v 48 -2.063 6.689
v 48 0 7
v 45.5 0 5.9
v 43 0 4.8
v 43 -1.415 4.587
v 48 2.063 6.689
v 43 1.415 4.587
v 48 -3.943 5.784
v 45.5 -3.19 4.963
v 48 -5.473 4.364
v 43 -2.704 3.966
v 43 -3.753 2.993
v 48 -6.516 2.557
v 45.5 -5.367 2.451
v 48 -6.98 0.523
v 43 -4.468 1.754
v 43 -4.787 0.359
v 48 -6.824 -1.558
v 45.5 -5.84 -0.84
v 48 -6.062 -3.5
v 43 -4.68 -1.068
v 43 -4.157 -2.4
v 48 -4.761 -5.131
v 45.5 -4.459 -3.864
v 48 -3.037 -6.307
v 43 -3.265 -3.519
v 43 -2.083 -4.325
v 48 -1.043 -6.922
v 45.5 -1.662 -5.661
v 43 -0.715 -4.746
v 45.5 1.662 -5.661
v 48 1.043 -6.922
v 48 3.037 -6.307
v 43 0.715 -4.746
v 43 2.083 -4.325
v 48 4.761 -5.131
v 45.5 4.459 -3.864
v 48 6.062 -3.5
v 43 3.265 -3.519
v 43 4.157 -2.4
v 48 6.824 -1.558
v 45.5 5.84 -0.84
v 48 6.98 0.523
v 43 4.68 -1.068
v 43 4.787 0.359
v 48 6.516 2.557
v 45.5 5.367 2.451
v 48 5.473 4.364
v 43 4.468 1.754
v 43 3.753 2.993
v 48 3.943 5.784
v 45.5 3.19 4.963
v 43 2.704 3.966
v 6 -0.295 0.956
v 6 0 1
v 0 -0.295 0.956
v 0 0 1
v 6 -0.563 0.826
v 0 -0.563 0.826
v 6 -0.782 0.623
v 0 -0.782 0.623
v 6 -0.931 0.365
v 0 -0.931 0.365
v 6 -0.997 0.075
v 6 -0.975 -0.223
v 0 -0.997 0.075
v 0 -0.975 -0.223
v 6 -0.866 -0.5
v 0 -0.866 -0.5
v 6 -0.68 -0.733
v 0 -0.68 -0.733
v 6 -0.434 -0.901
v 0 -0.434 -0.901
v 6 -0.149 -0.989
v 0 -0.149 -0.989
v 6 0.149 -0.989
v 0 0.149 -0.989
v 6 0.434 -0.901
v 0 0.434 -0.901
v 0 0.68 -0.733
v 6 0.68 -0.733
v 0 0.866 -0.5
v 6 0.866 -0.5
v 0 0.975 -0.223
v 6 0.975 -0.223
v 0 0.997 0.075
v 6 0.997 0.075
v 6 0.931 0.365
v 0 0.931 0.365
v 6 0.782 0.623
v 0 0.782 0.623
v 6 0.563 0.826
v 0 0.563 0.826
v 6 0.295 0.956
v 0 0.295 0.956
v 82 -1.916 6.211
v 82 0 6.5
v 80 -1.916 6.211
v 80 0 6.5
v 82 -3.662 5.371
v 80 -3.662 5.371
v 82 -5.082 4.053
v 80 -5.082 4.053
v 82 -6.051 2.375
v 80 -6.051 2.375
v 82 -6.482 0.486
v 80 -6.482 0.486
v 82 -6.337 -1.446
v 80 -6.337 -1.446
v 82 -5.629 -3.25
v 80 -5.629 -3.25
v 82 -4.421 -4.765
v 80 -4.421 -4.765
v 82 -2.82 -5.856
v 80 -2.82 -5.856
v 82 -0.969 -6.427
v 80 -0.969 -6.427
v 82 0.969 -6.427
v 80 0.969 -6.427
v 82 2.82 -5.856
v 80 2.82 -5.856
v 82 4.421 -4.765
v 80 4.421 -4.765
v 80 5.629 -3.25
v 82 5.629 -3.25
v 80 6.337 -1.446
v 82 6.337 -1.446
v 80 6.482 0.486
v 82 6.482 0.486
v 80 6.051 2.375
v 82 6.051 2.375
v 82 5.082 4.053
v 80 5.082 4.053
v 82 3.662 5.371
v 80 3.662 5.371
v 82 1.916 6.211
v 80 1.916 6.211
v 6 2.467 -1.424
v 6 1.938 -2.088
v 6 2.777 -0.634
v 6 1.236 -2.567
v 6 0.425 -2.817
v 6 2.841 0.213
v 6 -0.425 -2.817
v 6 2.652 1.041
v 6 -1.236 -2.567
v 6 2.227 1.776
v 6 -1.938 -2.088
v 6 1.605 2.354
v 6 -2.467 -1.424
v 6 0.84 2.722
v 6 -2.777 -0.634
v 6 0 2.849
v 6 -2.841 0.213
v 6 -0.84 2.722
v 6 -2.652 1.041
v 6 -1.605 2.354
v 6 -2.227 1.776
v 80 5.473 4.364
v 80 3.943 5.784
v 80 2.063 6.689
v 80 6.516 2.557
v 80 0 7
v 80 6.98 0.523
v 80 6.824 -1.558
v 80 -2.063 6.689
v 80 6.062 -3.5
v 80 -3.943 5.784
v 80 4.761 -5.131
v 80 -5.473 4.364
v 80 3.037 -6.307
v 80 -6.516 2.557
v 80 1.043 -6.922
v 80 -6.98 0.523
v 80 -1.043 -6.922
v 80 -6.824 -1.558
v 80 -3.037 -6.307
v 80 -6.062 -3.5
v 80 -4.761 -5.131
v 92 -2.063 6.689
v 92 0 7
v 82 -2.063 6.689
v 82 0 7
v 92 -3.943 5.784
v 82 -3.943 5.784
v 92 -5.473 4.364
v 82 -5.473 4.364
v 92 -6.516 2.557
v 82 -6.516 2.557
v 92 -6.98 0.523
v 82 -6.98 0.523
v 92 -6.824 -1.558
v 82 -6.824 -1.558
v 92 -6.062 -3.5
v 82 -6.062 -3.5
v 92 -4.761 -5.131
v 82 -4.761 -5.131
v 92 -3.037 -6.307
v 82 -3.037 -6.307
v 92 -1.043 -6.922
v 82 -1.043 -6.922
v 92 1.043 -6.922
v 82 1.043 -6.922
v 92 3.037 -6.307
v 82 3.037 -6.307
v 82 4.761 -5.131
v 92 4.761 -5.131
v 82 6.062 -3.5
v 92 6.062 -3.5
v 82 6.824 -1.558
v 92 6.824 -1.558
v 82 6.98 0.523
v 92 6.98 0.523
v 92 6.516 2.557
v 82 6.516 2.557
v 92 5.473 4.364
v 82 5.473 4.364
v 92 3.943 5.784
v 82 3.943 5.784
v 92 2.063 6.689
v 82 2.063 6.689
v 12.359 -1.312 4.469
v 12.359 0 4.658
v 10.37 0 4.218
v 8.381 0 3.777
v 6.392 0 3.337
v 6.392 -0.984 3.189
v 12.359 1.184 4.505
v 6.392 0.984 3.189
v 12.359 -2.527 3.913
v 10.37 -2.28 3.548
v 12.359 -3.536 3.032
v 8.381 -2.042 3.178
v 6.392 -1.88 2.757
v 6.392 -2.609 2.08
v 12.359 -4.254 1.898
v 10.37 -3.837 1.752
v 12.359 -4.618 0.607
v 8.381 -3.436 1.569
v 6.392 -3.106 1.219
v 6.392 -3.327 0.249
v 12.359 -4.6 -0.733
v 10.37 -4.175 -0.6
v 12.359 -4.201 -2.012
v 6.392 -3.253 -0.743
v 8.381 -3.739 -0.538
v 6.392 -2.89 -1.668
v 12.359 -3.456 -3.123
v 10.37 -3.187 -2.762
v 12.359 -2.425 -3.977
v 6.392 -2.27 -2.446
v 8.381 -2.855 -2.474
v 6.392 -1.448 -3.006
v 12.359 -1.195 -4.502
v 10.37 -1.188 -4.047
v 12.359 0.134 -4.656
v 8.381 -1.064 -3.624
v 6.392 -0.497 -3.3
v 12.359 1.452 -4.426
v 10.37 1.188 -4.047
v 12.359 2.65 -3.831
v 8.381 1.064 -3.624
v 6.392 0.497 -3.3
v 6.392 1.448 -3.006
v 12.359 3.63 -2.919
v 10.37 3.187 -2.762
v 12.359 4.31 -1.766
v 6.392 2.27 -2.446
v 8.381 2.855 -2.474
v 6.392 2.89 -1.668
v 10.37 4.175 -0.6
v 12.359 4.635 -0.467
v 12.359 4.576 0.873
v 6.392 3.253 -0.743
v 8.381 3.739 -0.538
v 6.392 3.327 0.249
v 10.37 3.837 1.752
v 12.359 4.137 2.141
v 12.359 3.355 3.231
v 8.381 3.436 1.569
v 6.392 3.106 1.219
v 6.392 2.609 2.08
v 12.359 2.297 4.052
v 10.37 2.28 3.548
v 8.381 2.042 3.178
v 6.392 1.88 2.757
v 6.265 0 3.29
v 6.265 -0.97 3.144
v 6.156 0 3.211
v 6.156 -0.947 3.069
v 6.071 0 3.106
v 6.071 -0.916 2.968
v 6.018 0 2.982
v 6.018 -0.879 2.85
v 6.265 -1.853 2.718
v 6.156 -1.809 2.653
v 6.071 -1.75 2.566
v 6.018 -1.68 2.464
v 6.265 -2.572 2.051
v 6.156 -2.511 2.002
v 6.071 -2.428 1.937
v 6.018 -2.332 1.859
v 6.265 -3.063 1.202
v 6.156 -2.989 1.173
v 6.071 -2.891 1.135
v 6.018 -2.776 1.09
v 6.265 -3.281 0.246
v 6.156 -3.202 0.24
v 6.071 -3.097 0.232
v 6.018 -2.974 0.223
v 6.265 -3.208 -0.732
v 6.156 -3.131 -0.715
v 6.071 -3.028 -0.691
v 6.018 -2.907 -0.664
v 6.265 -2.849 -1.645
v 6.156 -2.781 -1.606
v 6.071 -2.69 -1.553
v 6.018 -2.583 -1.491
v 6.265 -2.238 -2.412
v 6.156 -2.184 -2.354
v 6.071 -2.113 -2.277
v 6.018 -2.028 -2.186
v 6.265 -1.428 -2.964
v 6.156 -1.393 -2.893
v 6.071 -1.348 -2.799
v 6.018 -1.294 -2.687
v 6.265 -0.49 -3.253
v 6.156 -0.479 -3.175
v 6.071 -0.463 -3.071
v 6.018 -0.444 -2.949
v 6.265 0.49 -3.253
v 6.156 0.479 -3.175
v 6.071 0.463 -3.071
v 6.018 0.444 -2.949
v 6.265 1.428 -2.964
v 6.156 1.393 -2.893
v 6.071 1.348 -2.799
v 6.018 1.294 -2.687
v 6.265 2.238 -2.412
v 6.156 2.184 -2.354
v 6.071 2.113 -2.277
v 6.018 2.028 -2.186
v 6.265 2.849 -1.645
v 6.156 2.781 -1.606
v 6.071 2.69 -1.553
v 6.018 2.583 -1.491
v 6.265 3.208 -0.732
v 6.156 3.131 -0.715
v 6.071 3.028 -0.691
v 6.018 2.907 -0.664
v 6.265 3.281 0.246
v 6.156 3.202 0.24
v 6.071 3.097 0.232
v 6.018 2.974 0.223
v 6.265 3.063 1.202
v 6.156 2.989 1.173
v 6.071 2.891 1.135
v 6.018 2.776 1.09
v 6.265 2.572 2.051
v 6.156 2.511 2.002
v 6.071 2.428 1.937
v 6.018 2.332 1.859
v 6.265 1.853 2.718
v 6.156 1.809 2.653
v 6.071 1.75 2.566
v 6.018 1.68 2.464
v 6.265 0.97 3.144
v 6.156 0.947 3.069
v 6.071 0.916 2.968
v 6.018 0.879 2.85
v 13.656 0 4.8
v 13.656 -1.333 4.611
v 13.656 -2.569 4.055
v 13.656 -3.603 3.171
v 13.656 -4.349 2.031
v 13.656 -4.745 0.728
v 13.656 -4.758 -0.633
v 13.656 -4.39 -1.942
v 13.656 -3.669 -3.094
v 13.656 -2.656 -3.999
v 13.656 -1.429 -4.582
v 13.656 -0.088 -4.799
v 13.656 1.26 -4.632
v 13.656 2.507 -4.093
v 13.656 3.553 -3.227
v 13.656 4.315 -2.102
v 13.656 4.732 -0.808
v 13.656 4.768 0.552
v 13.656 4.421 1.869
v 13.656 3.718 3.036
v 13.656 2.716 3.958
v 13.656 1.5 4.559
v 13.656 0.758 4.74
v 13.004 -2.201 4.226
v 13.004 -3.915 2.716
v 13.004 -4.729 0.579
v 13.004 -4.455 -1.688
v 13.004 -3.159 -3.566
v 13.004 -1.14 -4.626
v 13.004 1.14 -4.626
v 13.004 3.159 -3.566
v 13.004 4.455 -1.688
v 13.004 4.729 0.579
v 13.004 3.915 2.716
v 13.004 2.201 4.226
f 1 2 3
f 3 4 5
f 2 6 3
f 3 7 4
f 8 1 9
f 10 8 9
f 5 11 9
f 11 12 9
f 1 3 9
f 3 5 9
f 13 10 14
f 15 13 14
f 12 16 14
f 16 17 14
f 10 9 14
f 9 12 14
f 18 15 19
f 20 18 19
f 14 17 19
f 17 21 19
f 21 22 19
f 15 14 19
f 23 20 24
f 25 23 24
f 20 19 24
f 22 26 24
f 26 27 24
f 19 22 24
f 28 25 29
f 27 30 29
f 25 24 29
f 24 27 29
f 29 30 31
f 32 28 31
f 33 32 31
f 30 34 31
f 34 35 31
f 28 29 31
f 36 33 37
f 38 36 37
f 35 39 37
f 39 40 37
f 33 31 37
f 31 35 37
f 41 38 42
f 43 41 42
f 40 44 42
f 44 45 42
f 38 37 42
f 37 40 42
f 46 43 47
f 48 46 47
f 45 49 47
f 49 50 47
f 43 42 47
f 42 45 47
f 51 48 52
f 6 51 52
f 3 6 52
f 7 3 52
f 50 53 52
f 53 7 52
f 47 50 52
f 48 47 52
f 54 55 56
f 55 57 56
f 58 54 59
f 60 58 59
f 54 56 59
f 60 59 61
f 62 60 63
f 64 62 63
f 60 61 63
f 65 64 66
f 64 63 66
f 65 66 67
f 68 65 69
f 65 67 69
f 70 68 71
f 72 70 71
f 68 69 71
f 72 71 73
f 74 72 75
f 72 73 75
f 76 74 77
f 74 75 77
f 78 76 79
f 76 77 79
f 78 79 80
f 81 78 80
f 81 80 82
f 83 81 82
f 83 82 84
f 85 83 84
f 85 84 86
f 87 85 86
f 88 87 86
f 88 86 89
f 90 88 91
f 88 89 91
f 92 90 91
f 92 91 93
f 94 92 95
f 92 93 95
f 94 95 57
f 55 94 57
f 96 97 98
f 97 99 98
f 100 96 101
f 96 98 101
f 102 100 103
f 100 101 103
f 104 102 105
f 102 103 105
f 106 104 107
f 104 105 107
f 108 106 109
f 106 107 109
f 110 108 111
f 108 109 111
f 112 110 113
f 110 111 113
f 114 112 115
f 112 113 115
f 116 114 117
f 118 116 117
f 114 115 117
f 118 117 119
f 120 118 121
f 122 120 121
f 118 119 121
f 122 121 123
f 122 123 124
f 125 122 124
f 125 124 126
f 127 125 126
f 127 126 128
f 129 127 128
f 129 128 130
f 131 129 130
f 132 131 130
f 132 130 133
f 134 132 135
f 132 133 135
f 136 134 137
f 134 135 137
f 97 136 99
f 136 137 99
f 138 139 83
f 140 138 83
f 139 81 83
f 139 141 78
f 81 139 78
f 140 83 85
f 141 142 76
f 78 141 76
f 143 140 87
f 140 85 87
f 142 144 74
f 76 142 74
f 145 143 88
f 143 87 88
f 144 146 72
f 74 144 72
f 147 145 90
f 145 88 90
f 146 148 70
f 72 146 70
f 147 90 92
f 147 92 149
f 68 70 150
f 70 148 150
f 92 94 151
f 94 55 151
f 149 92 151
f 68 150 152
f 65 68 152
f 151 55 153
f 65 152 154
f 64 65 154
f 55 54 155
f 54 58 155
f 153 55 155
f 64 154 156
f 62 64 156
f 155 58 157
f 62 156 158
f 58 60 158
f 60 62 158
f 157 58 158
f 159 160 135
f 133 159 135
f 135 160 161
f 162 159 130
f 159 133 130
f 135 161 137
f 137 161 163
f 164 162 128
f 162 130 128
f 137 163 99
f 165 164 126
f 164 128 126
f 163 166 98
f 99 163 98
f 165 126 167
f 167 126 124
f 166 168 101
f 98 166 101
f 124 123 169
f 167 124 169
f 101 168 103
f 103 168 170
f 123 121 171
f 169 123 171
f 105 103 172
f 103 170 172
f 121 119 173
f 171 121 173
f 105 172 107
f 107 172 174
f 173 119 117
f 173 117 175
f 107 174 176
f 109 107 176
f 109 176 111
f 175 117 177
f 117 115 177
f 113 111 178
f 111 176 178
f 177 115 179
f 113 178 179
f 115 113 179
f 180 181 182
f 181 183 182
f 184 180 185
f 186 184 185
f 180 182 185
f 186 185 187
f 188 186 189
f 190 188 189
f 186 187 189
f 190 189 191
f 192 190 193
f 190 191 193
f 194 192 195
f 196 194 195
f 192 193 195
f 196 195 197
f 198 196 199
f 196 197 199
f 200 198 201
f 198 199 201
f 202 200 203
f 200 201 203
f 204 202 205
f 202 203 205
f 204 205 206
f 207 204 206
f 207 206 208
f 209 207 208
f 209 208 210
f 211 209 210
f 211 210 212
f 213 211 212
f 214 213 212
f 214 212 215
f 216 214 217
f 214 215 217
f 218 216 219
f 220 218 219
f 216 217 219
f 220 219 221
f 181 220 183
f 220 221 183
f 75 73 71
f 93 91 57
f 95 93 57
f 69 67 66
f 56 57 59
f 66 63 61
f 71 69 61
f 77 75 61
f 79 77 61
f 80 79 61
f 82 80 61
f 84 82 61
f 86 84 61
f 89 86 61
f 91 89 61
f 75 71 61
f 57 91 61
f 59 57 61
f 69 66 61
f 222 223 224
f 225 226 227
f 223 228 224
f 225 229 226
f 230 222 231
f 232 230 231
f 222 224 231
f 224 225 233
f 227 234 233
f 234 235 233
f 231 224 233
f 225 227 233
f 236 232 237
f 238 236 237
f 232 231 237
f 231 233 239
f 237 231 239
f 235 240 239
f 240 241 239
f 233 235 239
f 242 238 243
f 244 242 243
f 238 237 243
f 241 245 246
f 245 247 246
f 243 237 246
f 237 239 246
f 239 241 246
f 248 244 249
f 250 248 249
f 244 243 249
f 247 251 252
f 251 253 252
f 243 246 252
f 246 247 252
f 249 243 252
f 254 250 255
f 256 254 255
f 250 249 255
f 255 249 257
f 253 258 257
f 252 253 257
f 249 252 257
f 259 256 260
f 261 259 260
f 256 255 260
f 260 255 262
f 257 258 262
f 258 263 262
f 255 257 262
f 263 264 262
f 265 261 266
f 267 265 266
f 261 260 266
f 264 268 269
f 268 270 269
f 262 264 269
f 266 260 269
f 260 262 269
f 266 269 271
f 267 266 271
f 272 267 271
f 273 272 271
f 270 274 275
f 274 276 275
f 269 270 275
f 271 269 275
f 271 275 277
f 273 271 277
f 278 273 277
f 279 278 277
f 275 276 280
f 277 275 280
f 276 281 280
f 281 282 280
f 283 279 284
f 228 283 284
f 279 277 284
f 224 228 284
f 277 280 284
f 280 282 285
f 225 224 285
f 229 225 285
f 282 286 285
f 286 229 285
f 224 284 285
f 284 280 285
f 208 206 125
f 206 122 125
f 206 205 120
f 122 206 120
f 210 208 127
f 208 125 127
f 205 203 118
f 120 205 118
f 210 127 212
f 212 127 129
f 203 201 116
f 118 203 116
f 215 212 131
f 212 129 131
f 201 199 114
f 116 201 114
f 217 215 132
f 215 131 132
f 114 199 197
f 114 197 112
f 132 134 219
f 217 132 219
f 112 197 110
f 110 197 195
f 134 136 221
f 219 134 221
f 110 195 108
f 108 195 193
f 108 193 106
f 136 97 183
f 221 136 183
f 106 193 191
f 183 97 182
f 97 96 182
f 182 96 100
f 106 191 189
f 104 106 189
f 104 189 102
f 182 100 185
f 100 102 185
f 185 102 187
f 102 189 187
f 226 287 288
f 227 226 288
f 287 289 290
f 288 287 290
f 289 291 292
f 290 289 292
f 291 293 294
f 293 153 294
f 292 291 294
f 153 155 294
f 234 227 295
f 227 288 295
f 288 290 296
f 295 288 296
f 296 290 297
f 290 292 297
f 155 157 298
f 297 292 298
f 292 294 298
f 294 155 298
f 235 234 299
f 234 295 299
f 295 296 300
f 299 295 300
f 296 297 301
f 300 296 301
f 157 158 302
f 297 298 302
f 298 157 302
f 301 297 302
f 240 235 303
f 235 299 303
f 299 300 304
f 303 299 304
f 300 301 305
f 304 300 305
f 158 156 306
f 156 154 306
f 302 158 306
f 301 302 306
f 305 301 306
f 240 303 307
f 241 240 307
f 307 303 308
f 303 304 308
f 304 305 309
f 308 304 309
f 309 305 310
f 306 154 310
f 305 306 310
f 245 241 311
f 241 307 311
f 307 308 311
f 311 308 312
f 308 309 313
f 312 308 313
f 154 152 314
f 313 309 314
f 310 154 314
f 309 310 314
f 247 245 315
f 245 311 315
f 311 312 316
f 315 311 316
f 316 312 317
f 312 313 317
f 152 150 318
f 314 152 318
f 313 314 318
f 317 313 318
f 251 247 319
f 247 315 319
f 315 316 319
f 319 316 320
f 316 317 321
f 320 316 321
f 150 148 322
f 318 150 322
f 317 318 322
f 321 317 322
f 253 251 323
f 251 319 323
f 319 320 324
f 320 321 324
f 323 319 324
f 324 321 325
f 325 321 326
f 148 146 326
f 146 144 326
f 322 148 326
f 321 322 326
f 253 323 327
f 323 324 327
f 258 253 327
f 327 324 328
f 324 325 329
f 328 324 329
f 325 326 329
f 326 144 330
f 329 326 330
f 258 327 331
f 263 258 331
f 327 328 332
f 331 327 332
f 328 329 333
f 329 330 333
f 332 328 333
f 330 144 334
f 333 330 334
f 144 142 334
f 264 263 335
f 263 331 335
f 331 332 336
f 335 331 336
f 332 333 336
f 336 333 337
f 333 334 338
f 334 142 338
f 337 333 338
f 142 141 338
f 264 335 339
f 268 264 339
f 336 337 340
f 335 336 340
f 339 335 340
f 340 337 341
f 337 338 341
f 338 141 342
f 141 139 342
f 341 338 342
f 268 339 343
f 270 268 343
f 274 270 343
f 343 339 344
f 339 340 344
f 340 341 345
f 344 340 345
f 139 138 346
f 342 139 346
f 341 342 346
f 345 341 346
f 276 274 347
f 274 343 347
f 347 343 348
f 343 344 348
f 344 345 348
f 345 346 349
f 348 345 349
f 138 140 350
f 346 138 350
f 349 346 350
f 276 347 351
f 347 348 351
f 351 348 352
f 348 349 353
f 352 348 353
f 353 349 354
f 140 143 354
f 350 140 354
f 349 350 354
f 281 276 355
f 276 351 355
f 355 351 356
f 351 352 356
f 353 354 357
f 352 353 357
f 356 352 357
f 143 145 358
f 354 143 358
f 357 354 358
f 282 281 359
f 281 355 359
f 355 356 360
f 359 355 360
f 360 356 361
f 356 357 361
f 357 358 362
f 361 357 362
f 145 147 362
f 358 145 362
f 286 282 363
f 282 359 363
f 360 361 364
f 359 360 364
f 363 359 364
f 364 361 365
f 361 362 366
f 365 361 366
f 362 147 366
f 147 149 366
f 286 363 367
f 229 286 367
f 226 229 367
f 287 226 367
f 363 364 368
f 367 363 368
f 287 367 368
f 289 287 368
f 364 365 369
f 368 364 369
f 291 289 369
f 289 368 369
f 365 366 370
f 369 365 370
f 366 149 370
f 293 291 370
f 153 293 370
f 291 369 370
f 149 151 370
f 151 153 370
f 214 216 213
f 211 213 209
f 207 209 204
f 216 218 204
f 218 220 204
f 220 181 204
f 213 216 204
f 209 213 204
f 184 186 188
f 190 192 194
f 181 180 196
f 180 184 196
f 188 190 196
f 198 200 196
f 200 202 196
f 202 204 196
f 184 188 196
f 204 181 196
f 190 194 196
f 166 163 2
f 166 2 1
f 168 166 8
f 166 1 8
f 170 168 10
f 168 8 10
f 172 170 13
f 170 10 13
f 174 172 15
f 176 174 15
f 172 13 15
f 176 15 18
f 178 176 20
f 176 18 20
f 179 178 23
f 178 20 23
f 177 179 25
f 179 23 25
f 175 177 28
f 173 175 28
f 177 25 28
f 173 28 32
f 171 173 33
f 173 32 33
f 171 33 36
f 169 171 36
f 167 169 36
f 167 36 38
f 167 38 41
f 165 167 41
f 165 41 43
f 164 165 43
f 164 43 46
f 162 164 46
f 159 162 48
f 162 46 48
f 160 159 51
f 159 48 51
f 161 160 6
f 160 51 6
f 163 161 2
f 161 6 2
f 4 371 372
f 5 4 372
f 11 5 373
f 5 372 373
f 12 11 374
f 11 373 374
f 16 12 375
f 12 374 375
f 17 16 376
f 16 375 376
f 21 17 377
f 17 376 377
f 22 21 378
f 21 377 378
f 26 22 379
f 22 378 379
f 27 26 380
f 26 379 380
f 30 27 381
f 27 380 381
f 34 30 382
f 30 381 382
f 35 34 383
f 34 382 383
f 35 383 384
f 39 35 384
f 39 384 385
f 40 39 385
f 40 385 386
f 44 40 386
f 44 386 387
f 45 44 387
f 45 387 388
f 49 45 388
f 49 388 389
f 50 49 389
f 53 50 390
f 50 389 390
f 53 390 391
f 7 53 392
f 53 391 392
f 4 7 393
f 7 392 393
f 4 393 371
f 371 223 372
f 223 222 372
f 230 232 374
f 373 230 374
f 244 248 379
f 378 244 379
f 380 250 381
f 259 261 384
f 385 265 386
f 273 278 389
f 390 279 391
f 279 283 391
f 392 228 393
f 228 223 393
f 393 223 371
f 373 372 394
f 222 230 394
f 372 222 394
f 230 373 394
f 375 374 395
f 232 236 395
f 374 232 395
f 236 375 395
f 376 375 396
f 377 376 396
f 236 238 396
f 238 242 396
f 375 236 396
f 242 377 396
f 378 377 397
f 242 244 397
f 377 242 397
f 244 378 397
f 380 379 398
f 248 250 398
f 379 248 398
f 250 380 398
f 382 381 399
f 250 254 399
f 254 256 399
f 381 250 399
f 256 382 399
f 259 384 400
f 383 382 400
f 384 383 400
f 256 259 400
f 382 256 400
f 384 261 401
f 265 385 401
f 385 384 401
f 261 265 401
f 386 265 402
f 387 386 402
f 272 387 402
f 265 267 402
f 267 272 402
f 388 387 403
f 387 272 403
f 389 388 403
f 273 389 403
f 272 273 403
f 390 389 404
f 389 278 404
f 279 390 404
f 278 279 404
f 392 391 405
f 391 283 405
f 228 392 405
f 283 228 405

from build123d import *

# Parameters (mm, degrees)
FILETE2_R = 0.5
FILETE4_R = 6


with BuildPart() as part:
    # Esboço1 → Revolução1 (revolve)
    with BuildSketch(Plane.XY, mode=Mode.PRIVATE) as revolu_o1_sk:
        Polygon((0, 0), (92, 0), (92, 7), (82, 7), (82, 6.5), (80, 6.5), (80, 7), (48, 7), (43, 4.8), (13, 4.8), (6, 3.25), (6, 1), (0, 1), align=None)
    revolve(revolu_o1_sk.sketch.rotate(Axis((0, 0, 0), (1, 0, 0)), 90), axis=Axis((0, 0, 0), (1, 0, 0)))

    # Filete2
    filete2_edges = [part.edges().sort_by_distance(p)[0] for p in [
        (6, 0, -3.25),
    ]]
    fillet(filete2_edges, radius=FILETE2_R)

    # Filete4
    filete4_edges = [part.edges().sort_by_distance(p)[0] for p in [
        (13, 0, -4.8),
    ]]
    fillet(filete4_edges, radius=FILETE4_R)


solid = part.part
